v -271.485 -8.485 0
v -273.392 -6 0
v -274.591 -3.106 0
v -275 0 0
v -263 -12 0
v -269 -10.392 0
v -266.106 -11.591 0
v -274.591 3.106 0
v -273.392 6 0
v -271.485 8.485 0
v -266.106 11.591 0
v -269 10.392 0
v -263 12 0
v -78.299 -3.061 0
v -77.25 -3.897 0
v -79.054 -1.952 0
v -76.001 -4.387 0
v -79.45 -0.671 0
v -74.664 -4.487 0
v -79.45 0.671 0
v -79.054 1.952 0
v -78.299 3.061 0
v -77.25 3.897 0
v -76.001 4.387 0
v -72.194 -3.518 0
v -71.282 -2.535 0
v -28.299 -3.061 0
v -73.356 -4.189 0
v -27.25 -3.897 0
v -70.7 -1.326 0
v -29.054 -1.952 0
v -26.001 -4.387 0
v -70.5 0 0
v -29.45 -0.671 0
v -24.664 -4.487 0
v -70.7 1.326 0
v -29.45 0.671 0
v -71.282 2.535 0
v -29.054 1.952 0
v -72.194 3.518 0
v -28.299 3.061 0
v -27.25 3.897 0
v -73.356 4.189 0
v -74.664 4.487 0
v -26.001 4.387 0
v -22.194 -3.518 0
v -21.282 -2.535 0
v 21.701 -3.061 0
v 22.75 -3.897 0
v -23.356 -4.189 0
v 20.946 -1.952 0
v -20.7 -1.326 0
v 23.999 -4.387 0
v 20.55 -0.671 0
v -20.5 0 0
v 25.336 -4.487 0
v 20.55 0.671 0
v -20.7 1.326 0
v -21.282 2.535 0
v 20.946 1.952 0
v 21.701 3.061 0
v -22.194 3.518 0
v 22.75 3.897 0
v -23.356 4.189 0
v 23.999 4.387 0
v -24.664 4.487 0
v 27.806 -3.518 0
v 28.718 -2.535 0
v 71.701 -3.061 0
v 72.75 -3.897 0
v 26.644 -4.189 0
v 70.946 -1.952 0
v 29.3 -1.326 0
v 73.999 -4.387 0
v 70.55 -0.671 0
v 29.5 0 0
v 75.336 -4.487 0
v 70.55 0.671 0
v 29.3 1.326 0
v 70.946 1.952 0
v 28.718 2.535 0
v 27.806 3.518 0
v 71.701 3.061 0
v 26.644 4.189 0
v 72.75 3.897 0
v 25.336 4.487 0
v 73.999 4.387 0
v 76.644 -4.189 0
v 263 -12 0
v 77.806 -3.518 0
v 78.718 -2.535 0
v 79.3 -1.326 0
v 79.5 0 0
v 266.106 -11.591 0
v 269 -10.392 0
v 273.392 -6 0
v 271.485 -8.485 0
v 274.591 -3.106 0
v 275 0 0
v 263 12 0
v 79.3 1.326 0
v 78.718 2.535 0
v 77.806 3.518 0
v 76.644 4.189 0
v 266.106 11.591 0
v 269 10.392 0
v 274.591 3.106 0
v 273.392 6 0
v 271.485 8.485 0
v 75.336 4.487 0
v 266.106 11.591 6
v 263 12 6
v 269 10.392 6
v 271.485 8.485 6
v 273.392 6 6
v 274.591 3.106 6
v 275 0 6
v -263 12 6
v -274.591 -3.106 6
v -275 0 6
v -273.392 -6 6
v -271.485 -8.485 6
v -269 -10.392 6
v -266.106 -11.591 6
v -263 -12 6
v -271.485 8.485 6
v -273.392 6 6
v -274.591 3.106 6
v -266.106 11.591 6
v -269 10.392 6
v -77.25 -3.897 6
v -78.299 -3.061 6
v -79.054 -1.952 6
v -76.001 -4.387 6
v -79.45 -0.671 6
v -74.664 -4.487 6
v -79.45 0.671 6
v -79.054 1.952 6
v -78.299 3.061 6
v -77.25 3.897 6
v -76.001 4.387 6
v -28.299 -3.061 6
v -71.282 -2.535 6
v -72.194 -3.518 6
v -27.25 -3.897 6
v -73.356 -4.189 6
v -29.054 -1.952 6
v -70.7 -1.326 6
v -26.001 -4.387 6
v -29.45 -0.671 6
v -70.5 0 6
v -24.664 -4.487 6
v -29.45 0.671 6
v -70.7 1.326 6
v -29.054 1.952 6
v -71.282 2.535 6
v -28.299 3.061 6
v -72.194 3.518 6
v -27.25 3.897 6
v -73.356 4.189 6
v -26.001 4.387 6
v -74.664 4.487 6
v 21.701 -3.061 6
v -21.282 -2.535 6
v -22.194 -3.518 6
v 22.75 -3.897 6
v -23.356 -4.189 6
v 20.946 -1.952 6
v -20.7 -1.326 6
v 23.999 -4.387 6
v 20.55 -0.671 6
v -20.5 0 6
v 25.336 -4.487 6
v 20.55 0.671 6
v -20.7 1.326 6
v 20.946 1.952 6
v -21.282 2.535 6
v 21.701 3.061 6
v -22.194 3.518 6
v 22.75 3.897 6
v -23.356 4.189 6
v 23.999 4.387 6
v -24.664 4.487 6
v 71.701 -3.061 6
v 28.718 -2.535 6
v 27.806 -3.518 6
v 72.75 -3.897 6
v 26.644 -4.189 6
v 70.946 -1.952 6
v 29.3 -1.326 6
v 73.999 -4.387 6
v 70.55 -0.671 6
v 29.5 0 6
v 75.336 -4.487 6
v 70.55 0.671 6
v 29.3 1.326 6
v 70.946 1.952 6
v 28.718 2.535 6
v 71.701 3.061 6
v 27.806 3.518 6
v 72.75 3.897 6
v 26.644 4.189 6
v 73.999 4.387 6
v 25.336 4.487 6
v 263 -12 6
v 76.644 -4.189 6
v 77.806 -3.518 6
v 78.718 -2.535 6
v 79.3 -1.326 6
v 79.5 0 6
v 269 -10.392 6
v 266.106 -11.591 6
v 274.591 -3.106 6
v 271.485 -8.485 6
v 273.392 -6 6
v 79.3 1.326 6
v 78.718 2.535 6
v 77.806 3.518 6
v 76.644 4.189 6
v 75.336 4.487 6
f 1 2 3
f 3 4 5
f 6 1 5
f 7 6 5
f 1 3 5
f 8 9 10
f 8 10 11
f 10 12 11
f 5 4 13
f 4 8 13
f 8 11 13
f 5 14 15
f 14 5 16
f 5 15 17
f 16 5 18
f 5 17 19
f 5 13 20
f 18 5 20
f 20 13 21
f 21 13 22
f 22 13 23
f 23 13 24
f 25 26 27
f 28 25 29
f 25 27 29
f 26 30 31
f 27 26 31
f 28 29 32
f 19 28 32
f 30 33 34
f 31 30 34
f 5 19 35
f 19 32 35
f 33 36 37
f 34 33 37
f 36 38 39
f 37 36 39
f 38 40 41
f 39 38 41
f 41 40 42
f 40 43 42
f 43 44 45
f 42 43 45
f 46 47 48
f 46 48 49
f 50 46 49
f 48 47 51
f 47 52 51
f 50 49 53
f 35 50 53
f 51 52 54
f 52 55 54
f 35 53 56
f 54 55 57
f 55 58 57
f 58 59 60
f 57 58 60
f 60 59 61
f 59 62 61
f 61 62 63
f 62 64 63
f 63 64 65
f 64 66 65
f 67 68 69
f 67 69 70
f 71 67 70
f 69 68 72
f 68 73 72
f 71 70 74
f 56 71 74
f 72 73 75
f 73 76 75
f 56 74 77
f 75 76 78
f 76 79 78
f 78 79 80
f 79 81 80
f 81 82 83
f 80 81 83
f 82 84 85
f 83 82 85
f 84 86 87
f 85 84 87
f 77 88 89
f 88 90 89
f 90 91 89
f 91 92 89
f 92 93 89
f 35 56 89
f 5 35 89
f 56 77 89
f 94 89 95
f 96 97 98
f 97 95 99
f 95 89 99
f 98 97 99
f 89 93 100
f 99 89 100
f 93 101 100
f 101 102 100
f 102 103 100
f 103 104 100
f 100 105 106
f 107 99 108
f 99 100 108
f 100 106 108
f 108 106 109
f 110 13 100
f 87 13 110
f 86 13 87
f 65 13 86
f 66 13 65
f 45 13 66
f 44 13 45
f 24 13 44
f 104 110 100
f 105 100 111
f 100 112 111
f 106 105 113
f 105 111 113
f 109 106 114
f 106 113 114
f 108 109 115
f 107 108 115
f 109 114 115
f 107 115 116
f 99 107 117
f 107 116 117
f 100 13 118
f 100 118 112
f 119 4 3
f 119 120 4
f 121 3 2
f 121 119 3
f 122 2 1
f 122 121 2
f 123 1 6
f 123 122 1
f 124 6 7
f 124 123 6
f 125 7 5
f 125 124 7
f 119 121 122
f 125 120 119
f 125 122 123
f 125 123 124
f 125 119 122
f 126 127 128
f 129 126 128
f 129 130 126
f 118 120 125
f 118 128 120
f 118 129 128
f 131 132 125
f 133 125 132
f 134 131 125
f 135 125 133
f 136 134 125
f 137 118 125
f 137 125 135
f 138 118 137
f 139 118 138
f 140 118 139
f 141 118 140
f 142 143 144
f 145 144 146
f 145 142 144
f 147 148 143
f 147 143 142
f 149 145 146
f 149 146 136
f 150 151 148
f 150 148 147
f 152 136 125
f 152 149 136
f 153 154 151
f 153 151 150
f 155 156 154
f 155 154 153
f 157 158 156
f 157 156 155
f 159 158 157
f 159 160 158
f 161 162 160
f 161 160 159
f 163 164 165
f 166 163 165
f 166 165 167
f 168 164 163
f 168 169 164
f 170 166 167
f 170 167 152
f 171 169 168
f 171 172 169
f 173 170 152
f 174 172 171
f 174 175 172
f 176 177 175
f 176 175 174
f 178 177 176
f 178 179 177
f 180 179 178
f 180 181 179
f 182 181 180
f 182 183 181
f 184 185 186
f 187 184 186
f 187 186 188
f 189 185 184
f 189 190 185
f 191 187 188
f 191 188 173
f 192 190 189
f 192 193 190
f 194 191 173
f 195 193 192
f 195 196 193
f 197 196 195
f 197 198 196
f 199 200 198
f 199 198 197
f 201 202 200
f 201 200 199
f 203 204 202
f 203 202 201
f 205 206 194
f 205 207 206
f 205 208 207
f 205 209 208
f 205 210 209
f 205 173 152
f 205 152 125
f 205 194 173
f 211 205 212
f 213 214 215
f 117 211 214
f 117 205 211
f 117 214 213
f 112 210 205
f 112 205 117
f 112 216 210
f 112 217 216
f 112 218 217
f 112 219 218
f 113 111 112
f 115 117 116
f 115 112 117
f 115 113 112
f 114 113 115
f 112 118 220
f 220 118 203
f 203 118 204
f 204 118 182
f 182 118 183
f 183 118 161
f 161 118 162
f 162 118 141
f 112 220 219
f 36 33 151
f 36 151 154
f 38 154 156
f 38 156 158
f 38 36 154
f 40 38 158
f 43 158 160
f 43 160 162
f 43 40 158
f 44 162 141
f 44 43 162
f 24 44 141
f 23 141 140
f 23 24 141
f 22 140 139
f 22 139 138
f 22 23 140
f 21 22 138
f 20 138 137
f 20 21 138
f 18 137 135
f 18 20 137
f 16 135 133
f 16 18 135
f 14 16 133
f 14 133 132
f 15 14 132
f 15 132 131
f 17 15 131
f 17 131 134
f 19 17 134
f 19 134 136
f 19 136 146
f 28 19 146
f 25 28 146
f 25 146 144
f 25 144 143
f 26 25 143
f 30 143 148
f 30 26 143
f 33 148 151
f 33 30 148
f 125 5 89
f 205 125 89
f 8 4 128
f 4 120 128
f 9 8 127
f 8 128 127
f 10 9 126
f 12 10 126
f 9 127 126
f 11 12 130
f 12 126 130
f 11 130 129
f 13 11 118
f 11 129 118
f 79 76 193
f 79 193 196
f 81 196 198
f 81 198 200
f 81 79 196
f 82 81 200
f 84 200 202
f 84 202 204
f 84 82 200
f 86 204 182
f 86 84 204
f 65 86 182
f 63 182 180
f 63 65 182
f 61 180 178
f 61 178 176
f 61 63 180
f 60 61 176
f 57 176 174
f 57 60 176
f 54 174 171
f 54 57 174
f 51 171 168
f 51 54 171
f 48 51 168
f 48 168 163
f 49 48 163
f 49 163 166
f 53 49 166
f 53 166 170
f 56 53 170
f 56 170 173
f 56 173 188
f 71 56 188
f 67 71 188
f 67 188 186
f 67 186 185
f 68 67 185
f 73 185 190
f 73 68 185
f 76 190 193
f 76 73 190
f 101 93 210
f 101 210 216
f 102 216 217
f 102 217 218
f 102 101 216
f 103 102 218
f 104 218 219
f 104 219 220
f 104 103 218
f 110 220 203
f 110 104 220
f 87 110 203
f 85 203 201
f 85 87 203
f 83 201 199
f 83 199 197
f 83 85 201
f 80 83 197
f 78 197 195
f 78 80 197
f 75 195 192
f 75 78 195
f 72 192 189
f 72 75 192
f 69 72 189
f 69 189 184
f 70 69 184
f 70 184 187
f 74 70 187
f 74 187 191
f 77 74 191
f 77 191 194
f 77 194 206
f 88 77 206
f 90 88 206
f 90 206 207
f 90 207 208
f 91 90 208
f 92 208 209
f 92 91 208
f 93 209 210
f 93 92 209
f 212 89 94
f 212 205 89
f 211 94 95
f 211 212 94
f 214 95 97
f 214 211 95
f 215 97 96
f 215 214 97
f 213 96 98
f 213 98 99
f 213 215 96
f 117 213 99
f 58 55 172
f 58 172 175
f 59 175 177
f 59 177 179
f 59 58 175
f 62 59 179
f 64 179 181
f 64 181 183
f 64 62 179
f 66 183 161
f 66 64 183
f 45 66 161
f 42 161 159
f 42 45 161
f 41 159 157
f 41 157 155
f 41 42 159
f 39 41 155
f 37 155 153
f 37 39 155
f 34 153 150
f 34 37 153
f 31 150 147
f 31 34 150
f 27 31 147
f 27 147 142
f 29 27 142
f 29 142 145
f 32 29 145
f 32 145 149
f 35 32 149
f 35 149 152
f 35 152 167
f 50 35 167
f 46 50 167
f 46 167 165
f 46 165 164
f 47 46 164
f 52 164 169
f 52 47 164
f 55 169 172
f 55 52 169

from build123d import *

# Parameters (mm, degrees)
SKETCH1_W           = 550
SKETCH1_H           = 24
SKETCH1_R           = 4.5
BOSS_EXTRUDE1_DEPTH = 6
FILLET2_R           = 12


with BuildPart() as part:
    # Sketch1 → Boss-Extrude1 (new body)
    with BuildSketch(Plane.XY):
        Rectangle(SKETCH1_W, SKETCH1_H)
        with Locations((75, 0)):
            Circle(SKETCH1_R, mode=Mode.SUBTRACT)
        with Locations((25, 0)):
            Circle(SKETCH1_R, mode=Mode.SUBTRACT)
        with Locations((-25, 0)):
            Circle(SKETCH1_R, mode=Mode.SUBTRACT)
        with Locations((-75, 0)):
            Circle(SKETCH1_R, mode=Mode.SUBTRACT)
    extrude(amount=BOSS_EXTRUDE1_DEPTH)

    # Fillet2
    fillet2_edges = [part.edges().sort_by_distance(p)[0] for p in [
        (-275, -12, 3),
        (-275, 12, 3),
        (275, 12, 3),
        (275, -12, 3),
    ]]
    fillet(fillet2_edges, radius=FILLET2_R - 0.0001)  # a hair under: the kernel refuses the full size


solid = part.part
